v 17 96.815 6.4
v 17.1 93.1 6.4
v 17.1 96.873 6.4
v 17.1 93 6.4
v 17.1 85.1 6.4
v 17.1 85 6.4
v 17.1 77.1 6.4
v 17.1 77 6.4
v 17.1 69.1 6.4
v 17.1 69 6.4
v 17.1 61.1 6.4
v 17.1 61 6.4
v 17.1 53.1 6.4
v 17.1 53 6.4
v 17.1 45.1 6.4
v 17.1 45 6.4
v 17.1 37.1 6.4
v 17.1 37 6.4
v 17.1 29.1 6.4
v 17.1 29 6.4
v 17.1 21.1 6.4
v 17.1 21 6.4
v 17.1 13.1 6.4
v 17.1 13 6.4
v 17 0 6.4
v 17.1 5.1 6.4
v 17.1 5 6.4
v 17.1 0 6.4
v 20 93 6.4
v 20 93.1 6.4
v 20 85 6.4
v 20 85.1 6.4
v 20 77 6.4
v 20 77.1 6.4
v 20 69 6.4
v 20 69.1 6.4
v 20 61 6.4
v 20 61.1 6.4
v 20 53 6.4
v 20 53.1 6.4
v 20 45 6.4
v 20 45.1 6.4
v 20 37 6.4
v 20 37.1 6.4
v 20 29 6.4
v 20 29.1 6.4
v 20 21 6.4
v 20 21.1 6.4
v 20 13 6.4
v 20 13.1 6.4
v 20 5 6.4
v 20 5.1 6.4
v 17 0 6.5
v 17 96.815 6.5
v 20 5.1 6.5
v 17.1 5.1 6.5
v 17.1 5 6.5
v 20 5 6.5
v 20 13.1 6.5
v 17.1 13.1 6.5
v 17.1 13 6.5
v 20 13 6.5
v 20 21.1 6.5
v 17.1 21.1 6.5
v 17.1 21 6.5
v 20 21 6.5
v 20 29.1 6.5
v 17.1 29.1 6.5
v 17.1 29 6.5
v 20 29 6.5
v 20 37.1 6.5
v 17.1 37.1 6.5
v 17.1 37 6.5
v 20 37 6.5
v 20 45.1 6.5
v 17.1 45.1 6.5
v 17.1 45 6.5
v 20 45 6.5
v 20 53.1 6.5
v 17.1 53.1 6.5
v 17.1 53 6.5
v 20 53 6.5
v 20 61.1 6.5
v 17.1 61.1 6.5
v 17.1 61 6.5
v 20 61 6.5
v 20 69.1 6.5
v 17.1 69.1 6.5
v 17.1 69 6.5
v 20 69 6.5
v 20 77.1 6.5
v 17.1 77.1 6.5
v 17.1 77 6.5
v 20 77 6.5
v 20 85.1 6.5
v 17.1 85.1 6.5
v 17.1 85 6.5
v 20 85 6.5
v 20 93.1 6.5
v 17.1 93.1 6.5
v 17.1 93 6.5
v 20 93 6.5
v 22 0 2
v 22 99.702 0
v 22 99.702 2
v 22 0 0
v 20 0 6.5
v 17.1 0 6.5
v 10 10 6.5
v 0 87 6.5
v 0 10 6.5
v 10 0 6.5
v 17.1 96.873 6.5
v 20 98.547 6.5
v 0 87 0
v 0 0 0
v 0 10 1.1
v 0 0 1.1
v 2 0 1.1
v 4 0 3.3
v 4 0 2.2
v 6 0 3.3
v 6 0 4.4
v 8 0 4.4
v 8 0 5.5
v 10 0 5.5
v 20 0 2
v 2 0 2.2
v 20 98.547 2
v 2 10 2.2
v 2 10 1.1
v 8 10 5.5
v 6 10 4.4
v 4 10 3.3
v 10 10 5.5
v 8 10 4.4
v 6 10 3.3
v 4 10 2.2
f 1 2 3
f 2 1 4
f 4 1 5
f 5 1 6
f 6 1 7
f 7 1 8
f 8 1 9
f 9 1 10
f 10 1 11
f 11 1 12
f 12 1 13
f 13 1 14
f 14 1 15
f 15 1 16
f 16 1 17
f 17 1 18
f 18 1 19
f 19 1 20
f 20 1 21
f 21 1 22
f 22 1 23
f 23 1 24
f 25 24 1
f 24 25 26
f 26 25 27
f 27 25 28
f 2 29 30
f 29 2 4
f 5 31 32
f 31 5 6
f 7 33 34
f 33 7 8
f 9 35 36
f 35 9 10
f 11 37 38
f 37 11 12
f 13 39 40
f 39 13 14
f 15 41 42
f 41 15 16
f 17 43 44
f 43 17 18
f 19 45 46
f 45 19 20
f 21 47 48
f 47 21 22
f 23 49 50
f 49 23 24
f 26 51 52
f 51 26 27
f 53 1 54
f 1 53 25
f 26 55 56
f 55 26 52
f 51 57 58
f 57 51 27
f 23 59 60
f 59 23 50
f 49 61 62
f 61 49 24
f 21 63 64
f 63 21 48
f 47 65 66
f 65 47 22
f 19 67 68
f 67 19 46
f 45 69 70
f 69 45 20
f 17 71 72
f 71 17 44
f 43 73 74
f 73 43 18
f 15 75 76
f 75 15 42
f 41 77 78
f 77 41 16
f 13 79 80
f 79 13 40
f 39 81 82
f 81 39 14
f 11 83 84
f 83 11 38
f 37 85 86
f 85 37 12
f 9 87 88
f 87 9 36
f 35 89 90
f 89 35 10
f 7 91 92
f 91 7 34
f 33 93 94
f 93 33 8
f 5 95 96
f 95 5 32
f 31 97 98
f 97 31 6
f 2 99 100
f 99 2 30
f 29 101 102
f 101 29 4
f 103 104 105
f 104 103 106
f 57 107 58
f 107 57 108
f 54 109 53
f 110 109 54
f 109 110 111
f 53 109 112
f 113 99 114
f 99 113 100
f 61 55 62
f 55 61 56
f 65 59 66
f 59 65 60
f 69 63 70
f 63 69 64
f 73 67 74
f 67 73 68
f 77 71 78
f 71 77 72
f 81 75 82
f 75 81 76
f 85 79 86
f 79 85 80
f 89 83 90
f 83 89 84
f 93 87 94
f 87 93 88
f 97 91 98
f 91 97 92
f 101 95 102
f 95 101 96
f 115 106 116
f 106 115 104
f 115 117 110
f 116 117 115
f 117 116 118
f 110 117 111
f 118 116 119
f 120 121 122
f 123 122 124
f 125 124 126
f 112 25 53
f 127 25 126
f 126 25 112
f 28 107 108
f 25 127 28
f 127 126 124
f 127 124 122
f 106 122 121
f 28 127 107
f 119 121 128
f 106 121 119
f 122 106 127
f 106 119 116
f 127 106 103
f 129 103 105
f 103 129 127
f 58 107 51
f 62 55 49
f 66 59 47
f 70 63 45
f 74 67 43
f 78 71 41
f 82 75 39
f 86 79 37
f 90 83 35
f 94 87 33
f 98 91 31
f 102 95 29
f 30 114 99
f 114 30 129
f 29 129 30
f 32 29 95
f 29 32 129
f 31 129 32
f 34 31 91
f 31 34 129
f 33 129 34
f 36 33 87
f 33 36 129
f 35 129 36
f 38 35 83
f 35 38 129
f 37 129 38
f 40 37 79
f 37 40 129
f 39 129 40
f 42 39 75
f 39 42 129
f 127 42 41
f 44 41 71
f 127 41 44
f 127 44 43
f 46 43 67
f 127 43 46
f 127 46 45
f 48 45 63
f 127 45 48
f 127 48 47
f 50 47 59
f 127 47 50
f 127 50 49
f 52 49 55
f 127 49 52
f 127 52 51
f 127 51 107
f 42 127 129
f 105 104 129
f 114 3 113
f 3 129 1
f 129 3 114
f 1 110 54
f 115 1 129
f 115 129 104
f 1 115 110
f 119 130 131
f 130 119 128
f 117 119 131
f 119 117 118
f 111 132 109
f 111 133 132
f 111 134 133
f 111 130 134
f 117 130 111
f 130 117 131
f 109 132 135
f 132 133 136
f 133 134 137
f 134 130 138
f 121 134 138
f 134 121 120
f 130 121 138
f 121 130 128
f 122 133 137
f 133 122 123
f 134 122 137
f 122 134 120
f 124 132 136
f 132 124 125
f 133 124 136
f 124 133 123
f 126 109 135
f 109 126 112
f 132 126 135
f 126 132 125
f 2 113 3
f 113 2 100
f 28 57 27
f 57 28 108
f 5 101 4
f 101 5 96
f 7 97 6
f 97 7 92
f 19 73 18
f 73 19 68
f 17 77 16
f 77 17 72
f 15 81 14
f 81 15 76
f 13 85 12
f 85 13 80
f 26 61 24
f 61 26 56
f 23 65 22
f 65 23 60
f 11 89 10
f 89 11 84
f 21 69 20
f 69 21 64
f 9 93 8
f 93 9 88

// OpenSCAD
WIDTH = 22;
LENGTH = 100; 
HEIGHT = 6.5;
difference() {
    cube([WIDTH, LENGTH, HEIGHT]);
    translate([20, -1, 2]) cube([WIDTH, LENGTH + 2, HEIGHT]);
    translate([0, LENGTH - 13, -1]) rotate([0,0,30]) cube([WIDTH + 10, LENGTH, HEIGHT+2]);
    translate([-WIDTH +2 , -1, 1.1]) cube([WIDTH, 11, HEIGHT]);
    translate([-WIDTH +4 , -1, 2.2]) cube([WIDTH, 11, HEIGHT]);
    translate([-WIDTH +6 , -1, 3.3]) cube([WIDTH, 11, HEIGHT]);
    translate([-WIDTH +8 , -1, 4.4]) cube([WIDTH, 11, HEIGHT]);
    translate([-WIDTH +10 , -1, 5.5]) cube([WIDTH, 11, HEIGHT]);

    translate([17, -1, 6.4]) cube([0.1, LENGTH + 2, HEIGHT]);
    for (i=[0:8:LENGTH]){
        translate([17, i-3, 6.4]) cube([4, 0.1, HEIGHT]);
    }
}
